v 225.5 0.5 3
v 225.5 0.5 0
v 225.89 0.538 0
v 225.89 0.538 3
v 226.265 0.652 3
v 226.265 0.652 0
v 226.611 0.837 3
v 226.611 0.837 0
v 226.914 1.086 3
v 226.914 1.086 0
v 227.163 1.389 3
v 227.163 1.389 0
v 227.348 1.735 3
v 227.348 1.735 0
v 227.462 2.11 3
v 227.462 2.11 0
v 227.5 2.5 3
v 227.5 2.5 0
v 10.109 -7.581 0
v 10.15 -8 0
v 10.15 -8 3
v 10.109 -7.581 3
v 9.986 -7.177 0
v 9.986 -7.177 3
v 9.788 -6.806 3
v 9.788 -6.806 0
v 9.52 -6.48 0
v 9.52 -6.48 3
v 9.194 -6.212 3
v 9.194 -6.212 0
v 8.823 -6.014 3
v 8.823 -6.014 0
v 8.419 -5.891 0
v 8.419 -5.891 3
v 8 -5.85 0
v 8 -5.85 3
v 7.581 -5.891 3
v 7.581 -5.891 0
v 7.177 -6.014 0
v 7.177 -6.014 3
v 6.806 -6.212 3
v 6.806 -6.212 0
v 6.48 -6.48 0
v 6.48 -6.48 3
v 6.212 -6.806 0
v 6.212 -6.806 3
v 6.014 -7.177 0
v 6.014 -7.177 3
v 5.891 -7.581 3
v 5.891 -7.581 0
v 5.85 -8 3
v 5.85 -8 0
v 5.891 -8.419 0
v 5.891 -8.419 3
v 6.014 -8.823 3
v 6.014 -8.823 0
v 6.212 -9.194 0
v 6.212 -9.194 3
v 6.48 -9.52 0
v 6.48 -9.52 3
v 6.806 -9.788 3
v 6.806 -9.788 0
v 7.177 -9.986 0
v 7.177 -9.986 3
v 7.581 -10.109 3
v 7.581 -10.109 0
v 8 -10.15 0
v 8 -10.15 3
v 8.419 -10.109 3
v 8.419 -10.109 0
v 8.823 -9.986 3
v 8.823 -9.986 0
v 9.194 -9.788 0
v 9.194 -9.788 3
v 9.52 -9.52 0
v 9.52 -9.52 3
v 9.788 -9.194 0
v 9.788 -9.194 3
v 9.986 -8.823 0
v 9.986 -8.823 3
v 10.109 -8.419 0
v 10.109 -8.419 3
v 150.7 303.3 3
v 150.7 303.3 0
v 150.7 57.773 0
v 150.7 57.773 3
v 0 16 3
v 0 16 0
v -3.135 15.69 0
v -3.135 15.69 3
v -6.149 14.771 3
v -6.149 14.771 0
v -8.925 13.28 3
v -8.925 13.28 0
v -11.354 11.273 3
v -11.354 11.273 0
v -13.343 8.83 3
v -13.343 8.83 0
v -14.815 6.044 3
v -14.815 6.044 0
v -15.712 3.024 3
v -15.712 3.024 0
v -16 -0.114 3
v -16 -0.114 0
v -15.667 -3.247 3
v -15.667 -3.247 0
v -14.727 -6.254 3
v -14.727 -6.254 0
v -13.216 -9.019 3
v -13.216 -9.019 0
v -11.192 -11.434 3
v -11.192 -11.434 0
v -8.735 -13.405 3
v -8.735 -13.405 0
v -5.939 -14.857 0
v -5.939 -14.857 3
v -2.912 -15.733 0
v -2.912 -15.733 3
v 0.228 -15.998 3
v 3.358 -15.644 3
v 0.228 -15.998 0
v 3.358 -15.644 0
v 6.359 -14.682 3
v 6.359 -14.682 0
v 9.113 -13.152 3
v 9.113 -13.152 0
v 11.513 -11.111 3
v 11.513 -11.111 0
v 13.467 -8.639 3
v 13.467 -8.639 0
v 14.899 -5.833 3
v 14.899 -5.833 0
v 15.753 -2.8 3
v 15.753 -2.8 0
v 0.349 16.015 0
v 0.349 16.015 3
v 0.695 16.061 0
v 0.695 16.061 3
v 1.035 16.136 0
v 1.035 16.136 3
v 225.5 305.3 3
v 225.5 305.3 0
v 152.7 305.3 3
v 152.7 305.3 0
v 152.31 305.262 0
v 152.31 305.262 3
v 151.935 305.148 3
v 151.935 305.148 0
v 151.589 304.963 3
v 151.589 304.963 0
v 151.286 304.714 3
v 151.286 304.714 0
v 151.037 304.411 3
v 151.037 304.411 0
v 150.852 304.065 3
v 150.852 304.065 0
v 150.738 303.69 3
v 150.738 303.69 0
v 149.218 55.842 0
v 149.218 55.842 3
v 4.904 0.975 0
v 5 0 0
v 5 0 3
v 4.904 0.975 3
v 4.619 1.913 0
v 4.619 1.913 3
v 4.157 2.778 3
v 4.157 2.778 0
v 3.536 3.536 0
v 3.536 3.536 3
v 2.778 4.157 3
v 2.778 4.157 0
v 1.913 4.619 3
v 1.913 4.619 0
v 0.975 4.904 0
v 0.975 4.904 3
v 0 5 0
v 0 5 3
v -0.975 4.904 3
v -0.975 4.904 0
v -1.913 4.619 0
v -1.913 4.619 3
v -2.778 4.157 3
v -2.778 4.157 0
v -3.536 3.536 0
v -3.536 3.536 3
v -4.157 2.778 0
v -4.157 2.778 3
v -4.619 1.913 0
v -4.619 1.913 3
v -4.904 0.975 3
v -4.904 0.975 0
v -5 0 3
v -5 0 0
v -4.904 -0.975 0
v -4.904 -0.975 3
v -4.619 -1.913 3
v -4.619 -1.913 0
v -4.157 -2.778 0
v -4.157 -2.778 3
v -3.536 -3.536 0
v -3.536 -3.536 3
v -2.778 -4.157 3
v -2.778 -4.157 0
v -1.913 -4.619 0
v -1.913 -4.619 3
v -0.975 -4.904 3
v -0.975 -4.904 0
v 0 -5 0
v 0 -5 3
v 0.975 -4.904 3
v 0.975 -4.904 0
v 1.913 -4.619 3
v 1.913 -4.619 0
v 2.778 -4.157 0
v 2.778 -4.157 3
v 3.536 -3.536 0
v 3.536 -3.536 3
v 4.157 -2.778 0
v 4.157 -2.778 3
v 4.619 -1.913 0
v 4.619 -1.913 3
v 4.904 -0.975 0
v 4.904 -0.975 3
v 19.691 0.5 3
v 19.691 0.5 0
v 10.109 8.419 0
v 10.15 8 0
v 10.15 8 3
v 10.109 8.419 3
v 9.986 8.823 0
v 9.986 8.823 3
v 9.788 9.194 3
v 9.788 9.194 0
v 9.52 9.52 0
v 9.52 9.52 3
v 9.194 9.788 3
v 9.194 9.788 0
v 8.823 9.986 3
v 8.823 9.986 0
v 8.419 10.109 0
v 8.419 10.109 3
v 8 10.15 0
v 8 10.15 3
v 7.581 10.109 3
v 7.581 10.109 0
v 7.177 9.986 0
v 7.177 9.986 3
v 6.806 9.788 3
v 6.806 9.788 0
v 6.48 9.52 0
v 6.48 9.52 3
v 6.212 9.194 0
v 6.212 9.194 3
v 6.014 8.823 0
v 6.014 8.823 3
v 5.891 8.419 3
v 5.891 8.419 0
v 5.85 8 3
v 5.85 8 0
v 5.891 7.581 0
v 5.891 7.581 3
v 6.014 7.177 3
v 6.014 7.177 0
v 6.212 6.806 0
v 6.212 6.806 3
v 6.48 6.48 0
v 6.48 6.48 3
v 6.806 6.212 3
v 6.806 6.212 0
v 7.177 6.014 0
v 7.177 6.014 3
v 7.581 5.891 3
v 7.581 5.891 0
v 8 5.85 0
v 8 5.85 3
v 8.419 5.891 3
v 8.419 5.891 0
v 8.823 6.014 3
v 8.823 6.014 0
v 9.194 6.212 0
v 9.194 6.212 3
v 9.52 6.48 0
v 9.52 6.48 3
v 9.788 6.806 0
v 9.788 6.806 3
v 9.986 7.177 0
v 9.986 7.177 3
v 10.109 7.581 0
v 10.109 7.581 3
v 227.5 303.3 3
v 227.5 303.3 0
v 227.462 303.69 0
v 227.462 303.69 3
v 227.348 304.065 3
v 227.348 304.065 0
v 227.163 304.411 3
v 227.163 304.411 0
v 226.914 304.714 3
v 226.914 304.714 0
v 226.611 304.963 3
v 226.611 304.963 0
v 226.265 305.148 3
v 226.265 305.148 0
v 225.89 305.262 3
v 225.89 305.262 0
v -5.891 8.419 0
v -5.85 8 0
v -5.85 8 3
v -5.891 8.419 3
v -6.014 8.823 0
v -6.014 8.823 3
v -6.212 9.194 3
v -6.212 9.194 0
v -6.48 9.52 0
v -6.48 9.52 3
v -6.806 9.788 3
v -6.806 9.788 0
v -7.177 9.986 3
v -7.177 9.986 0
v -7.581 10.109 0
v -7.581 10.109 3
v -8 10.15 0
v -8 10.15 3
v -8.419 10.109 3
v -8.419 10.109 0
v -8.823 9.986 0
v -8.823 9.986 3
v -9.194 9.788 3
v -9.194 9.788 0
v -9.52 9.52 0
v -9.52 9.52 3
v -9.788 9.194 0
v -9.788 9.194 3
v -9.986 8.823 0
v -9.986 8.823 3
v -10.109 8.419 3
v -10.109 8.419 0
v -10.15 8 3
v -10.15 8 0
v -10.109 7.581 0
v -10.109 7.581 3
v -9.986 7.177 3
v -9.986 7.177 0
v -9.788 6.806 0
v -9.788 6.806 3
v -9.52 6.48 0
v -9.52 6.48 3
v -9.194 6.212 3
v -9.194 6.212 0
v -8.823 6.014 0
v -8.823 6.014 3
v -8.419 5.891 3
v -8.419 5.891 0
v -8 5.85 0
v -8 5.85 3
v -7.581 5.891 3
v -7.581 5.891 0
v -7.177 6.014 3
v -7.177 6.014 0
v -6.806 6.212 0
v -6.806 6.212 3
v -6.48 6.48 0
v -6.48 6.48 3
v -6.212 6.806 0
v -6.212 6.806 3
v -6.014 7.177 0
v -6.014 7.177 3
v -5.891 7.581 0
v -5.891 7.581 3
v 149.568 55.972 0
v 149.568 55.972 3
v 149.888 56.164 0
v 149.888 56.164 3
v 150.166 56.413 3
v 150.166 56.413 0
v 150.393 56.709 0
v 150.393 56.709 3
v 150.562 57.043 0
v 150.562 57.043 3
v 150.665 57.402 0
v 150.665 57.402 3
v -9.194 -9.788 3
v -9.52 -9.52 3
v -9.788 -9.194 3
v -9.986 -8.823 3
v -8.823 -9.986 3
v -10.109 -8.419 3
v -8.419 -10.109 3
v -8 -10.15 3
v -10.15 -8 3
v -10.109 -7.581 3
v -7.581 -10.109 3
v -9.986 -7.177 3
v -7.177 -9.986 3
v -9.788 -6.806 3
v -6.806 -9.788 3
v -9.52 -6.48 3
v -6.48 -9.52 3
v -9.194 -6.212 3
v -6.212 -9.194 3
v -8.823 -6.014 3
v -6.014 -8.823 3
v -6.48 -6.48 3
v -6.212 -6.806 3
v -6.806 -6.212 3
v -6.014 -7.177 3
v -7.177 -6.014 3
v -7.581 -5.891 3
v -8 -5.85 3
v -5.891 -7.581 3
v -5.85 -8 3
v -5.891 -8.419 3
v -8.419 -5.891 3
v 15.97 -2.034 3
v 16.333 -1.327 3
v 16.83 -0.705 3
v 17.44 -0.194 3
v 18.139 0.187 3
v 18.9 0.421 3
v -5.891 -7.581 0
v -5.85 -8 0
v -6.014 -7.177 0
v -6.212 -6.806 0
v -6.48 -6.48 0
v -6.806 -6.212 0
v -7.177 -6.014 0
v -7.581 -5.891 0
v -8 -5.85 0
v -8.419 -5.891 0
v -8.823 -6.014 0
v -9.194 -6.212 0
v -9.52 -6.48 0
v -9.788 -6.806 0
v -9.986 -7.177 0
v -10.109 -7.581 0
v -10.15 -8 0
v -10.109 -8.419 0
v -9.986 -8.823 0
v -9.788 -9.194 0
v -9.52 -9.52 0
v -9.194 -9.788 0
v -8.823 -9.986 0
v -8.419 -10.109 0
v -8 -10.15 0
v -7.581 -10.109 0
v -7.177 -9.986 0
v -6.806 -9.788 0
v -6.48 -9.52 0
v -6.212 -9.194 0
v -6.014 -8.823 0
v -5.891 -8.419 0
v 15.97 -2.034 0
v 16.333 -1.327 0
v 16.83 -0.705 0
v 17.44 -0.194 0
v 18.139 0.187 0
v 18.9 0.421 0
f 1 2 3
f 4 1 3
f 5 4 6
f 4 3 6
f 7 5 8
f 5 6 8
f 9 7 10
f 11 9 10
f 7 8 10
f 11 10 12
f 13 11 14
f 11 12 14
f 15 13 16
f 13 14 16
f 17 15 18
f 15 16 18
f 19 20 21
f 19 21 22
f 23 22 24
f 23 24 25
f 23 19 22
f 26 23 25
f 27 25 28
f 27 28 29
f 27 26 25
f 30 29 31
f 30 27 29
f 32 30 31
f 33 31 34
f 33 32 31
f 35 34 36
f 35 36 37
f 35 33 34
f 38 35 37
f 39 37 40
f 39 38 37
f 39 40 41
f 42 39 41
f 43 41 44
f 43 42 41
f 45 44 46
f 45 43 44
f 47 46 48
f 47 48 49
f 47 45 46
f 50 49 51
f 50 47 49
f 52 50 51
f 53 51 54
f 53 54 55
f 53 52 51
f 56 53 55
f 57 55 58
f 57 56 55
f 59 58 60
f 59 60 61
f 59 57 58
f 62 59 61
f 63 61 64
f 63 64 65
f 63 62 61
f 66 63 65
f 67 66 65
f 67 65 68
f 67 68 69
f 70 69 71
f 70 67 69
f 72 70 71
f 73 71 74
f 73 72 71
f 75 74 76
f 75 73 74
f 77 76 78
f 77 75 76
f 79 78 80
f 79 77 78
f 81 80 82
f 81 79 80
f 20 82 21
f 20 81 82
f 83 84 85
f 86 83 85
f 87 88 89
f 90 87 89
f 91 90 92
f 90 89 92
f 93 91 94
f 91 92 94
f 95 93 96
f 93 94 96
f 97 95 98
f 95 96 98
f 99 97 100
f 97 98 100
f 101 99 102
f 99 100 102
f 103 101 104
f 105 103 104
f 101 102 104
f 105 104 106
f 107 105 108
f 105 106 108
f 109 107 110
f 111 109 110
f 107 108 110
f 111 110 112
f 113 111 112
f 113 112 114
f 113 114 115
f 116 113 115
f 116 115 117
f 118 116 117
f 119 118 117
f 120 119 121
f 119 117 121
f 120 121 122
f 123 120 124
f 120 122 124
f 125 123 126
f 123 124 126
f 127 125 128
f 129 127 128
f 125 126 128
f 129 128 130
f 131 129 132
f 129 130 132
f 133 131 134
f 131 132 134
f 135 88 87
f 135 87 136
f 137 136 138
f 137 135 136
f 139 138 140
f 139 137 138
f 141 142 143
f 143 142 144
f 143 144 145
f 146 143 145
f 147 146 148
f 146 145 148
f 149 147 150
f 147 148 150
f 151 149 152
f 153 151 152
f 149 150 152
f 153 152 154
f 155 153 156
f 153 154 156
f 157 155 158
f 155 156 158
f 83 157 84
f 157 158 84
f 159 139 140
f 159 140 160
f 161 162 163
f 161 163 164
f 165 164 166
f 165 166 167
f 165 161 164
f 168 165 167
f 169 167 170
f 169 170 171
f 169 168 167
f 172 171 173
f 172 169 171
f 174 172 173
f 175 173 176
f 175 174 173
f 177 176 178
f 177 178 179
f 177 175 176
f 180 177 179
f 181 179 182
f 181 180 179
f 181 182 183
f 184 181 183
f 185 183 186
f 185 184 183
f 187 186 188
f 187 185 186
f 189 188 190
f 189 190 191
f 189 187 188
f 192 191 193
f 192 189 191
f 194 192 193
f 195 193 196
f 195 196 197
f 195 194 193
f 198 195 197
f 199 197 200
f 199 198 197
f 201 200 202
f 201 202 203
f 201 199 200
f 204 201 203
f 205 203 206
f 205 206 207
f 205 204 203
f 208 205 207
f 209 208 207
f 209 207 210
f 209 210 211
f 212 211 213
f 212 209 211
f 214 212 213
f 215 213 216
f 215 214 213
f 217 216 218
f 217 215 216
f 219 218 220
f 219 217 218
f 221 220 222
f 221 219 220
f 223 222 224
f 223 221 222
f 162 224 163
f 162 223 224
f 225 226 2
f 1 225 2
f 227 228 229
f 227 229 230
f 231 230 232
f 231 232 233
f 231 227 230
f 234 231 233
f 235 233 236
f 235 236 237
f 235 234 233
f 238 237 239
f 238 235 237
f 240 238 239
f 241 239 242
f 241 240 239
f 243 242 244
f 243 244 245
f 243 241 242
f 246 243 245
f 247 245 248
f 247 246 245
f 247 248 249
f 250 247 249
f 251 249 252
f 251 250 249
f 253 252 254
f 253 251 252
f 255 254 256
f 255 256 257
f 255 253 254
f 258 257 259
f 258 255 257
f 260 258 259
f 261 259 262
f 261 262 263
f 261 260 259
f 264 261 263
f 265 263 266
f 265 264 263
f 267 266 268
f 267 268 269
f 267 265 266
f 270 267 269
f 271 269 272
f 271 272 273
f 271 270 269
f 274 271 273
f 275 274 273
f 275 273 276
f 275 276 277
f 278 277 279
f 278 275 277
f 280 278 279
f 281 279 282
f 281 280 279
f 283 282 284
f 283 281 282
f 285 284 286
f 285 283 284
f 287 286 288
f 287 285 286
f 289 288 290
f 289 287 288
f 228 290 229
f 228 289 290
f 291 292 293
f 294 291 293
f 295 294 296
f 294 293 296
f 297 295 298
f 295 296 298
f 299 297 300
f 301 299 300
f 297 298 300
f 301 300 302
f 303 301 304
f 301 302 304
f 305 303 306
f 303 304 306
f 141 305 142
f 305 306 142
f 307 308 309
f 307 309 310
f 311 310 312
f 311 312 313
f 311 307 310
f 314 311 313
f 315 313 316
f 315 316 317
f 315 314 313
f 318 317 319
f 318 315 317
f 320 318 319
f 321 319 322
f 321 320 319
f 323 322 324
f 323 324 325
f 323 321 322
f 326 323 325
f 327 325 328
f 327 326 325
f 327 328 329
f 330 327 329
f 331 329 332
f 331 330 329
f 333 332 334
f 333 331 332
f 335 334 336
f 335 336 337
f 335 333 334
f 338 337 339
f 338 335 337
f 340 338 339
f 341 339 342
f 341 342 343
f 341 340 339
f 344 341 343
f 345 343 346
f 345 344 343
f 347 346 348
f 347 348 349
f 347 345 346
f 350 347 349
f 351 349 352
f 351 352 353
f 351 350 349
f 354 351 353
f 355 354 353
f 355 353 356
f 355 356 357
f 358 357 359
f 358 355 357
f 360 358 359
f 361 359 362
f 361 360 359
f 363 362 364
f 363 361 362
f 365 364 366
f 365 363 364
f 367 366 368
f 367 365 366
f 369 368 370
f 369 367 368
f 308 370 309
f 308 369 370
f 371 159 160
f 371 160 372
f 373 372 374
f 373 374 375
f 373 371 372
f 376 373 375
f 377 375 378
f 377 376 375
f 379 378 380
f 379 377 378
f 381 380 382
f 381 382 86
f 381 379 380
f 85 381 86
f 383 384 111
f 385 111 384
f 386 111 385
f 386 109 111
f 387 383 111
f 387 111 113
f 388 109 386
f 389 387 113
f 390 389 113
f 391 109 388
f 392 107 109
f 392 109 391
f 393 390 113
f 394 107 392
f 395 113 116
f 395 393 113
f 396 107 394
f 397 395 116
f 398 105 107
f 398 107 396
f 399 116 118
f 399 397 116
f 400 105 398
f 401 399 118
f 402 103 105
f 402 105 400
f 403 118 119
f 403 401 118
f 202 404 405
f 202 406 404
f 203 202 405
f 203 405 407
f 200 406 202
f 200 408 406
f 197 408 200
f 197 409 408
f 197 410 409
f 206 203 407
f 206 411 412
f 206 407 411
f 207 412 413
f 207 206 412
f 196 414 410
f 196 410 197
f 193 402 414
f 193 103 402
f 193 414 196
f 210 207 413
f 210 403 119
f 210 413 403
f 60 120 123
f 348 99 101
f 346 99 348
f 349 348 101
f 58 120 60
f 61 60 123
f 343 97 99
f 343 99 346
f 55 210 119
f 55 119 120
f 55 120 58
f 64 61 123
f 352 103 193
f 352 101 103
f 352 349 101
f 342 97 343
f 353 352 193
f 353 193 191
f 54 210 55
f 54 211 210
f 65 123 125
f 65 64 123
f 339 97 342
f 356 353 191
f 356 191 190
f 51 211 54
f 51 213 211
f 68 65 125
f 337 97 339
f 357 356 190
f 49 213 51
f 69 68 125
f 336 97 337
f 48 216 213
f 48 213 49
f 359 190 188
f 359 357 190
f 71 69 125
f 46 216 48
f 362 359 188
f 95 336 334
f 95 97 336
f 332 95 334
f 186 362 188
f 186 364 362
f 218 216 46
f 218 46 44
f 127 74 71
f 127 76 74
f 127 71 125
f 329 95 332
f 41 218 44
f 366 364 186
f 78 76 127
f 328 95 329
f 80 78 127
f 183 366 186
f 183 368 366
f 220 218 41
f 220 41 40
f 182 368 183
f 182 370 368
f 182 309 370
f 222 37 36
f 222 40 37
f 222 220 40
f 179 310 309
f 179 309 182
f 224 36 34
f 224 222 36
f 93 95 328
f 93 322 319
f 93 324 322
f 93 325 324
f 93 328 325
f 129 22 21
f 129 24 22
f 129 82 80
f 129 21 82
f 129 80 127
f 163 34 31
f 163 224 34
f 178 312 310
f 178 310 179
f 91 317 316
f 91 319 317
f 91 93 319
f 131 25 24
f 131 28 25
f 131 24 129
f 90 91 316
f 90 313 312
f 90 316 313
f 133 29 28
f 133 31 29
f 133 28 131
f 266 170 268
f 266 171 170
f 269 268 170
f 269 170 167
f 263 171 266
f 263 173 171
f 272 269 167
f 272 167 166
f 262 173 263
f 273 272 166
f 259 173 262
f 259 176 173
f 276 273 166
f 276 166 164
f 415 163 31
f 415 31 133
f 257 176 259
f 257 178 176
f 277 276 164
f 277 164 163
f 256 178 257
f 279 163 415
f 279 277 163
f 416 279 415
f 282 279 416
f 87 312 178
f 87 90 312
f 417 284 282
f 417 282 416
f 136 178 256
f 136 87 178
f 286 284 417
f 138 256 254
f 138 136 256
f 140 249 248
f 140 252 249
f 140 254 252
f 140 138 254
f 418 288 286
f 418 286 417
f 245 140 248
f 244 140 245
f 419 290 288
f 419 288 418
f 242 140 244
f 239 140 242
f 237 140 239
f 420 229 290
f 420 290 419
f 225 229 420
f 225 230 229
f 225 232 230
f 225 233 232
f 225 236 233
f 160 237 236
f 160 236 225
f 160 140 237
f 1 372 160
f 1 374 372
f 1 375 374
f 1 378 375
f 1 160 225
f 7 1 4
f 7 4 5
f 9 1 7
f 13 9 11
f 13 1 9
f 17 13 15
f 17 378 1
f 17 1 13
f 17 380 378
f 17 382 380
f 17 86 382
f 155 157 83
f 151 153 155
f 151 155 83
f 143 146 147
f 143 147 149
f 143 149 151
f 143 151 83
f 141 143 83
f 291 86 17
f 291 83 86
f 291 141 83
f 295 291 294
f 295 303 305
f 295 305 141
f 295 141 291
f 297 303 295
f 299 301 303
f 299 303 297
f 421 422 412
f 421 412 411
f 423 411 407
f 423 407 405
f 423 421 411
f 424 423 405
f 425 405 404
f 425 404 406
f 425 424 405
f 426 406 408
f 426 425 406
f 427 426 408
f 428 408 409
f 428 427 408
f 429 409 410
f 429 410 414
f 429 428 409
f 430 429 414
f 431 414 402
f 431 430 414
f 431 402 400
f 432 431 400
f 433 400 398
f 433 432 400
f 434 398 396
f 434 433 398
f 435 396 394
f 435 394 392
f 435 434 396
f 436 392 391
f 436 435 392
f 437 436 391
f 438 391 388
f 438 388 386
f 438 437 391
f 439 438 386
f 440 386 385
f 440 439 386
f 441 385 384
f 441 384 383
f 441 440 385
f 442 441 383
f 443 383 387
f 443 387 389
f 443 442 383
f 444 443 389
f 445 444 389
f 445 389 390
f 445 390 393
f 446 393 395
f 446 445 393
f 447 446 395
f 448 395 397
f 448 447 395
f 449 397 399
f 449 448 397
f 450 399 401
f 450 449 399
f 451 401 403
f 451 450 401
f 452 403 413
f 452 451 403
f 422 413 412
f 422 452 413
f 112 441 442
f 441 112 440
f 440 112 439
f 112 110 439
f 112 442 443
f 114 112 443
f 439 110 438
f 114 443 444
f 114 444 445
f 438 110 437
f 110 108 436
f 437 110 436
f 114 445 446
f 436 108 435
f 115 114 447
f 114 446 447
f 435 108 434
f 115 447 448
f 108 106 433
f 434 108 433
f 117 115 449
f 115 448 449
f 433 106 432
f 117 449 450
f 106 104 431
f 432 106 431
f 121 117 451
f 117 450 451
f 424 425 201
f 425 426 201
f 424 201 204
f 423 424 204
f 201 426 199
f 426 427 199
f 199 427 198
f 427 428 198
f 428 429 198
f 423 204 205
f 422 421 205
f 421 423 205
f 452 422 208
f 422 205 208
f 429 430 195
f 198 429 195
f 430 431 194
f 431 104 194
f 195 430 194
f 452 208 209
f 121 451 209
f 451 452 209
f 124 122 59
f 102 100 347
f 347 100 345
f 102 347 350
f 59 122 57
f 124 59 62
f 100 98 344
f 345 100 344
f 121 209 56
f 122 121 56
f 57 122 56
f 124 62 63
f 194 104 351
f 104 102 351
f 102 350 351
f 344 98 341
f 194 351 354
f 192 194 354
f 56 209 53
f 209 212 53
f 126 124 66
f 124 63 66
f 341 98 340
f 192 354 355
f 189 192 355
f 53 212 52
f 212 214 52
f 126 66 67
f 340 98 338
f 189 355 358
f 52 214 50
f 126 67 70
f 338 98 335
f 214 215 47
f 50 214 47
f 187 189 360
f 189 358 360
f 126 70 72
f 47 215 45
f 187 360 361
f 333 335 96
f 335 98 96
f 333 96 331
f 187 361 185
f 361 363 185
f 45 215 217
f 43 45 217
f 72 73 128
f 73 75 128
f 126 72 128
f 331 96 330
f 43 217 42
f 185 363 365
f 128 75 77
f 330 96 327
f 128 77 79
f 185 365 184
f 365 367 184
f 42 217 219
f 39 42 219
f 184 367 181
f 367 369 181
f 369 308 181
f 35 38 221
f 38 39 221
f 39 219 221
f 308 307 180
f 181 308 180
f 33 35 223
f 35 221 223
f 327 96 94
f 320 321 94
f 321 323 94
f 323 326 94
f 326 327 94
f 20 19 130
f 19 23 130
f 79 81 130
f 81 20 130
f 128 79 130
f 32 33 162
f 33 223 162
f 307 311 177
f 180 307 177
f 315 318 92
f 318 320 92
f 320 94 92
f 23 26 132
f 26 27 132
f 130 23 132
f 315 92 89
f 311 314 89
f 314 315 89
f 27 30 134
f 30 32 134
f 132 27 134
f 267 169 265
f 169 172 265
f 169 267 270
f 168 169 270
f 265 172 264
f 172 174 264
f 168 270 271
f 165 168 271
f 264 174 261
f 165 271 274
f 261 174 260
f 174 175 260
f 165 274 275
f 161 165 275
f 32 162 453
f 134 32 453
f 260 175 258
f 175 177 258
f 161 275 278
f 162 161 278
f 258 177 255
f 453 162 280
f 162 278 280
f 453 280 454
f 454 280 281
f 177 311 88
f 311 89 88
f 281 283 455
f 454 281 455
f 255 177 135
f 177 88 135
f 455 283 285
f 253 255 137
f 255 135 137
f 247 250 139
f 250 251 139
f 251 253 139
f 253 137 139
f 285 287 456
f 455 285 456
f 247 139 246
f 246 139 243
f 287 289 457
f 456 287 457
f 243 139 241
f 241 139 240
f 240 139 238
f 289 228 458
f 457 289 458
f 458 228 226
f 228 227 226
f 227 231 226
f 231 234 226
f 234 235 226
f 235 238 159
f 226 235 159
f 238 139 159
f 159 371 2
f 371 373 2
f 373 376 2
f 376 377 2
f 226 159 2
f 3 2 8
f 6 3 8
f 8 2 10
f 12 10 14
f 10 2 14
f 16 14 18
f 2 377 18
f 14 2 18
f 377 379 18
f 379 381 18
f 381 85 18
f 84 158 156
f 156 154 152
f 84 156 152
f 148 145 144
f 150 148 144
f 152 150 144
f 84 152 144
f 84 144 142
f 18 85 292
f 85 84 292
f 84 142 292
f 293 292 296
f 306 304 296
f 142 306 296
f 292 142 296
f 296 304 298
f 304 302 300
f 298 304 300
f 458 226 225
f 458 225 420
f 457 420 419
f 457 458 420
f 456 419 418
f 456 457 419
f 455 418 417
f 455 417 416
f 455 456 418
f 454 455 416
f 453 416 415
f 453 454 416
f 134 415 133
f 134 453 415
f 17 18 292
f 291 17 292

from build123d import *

# Parameters (mm, degrees)
SKETCH_R   = 2.15
SKETCH_R_2 = 5
PAD_DEPTH  = 3


with BuildPart() as part:
    # Sketch → Pad (new body)
    with BuildSketch(Plane.XY):
        with BuildLine():
            Line((36.7, 0.5), (225.5, 0.5))
            ThreePointArc((225.5, 0.5), (226.914214, 1.085786), (227.5, 2.5))
            Line((227.5, 2.5), (227.5, 303.3))
            ThreePointArc((227.5, 303.3), (226.914214, 304.714214), (225.5, 305.3))
            Line((225.5, 305.3), (152.7, 305.3))
            ThreePointArc((152.7, 305.3), (151.285786, 304.714214), (150.7, 303.3))
            Line((150.7, 303.3), (150.7, 57.773493))
            ThreePointArc((149.217638, 55.841641), (150.286707, 56.55597), (150.7, 57.773493))
            Line((1.035276, 16.136297), (149.217638, 55.841641))
            ThreePointArc((0, 16), (0.522105, 16.034221), (1.035276, 16.136297))
            ThreePointArc((0, 16), (-12.263768, -10.276186), (15.753095, -2.8))
            ThreePointArc((19.691369, 0.5), (17.122322, -0.434058), (15.753095, -2.8))
            Line((36.7, 0.5), (19.691369, 0.5))
        make_face()
        with Locations((-8, 8)):
            Circle(SKETCH_R, mode=Mode.SUBTRACT)
        with Locations((8, 8)):
            Circle(SKETCH_R, mode=Mode.SUBTRACT)
        with Locations((-8, -8)):
            Circle(SKETCH_R, mode=Mode.SUBTRACT)
        with Locations((8, -8)):
            Circle(SKETCH_R, mode=Mode.SUBTRACT)
        Circle(SKETCH_R_2, mode=Mode.SUBTRACT)
    extrude(amount=PAD_DEPTH)


solid = part.part
